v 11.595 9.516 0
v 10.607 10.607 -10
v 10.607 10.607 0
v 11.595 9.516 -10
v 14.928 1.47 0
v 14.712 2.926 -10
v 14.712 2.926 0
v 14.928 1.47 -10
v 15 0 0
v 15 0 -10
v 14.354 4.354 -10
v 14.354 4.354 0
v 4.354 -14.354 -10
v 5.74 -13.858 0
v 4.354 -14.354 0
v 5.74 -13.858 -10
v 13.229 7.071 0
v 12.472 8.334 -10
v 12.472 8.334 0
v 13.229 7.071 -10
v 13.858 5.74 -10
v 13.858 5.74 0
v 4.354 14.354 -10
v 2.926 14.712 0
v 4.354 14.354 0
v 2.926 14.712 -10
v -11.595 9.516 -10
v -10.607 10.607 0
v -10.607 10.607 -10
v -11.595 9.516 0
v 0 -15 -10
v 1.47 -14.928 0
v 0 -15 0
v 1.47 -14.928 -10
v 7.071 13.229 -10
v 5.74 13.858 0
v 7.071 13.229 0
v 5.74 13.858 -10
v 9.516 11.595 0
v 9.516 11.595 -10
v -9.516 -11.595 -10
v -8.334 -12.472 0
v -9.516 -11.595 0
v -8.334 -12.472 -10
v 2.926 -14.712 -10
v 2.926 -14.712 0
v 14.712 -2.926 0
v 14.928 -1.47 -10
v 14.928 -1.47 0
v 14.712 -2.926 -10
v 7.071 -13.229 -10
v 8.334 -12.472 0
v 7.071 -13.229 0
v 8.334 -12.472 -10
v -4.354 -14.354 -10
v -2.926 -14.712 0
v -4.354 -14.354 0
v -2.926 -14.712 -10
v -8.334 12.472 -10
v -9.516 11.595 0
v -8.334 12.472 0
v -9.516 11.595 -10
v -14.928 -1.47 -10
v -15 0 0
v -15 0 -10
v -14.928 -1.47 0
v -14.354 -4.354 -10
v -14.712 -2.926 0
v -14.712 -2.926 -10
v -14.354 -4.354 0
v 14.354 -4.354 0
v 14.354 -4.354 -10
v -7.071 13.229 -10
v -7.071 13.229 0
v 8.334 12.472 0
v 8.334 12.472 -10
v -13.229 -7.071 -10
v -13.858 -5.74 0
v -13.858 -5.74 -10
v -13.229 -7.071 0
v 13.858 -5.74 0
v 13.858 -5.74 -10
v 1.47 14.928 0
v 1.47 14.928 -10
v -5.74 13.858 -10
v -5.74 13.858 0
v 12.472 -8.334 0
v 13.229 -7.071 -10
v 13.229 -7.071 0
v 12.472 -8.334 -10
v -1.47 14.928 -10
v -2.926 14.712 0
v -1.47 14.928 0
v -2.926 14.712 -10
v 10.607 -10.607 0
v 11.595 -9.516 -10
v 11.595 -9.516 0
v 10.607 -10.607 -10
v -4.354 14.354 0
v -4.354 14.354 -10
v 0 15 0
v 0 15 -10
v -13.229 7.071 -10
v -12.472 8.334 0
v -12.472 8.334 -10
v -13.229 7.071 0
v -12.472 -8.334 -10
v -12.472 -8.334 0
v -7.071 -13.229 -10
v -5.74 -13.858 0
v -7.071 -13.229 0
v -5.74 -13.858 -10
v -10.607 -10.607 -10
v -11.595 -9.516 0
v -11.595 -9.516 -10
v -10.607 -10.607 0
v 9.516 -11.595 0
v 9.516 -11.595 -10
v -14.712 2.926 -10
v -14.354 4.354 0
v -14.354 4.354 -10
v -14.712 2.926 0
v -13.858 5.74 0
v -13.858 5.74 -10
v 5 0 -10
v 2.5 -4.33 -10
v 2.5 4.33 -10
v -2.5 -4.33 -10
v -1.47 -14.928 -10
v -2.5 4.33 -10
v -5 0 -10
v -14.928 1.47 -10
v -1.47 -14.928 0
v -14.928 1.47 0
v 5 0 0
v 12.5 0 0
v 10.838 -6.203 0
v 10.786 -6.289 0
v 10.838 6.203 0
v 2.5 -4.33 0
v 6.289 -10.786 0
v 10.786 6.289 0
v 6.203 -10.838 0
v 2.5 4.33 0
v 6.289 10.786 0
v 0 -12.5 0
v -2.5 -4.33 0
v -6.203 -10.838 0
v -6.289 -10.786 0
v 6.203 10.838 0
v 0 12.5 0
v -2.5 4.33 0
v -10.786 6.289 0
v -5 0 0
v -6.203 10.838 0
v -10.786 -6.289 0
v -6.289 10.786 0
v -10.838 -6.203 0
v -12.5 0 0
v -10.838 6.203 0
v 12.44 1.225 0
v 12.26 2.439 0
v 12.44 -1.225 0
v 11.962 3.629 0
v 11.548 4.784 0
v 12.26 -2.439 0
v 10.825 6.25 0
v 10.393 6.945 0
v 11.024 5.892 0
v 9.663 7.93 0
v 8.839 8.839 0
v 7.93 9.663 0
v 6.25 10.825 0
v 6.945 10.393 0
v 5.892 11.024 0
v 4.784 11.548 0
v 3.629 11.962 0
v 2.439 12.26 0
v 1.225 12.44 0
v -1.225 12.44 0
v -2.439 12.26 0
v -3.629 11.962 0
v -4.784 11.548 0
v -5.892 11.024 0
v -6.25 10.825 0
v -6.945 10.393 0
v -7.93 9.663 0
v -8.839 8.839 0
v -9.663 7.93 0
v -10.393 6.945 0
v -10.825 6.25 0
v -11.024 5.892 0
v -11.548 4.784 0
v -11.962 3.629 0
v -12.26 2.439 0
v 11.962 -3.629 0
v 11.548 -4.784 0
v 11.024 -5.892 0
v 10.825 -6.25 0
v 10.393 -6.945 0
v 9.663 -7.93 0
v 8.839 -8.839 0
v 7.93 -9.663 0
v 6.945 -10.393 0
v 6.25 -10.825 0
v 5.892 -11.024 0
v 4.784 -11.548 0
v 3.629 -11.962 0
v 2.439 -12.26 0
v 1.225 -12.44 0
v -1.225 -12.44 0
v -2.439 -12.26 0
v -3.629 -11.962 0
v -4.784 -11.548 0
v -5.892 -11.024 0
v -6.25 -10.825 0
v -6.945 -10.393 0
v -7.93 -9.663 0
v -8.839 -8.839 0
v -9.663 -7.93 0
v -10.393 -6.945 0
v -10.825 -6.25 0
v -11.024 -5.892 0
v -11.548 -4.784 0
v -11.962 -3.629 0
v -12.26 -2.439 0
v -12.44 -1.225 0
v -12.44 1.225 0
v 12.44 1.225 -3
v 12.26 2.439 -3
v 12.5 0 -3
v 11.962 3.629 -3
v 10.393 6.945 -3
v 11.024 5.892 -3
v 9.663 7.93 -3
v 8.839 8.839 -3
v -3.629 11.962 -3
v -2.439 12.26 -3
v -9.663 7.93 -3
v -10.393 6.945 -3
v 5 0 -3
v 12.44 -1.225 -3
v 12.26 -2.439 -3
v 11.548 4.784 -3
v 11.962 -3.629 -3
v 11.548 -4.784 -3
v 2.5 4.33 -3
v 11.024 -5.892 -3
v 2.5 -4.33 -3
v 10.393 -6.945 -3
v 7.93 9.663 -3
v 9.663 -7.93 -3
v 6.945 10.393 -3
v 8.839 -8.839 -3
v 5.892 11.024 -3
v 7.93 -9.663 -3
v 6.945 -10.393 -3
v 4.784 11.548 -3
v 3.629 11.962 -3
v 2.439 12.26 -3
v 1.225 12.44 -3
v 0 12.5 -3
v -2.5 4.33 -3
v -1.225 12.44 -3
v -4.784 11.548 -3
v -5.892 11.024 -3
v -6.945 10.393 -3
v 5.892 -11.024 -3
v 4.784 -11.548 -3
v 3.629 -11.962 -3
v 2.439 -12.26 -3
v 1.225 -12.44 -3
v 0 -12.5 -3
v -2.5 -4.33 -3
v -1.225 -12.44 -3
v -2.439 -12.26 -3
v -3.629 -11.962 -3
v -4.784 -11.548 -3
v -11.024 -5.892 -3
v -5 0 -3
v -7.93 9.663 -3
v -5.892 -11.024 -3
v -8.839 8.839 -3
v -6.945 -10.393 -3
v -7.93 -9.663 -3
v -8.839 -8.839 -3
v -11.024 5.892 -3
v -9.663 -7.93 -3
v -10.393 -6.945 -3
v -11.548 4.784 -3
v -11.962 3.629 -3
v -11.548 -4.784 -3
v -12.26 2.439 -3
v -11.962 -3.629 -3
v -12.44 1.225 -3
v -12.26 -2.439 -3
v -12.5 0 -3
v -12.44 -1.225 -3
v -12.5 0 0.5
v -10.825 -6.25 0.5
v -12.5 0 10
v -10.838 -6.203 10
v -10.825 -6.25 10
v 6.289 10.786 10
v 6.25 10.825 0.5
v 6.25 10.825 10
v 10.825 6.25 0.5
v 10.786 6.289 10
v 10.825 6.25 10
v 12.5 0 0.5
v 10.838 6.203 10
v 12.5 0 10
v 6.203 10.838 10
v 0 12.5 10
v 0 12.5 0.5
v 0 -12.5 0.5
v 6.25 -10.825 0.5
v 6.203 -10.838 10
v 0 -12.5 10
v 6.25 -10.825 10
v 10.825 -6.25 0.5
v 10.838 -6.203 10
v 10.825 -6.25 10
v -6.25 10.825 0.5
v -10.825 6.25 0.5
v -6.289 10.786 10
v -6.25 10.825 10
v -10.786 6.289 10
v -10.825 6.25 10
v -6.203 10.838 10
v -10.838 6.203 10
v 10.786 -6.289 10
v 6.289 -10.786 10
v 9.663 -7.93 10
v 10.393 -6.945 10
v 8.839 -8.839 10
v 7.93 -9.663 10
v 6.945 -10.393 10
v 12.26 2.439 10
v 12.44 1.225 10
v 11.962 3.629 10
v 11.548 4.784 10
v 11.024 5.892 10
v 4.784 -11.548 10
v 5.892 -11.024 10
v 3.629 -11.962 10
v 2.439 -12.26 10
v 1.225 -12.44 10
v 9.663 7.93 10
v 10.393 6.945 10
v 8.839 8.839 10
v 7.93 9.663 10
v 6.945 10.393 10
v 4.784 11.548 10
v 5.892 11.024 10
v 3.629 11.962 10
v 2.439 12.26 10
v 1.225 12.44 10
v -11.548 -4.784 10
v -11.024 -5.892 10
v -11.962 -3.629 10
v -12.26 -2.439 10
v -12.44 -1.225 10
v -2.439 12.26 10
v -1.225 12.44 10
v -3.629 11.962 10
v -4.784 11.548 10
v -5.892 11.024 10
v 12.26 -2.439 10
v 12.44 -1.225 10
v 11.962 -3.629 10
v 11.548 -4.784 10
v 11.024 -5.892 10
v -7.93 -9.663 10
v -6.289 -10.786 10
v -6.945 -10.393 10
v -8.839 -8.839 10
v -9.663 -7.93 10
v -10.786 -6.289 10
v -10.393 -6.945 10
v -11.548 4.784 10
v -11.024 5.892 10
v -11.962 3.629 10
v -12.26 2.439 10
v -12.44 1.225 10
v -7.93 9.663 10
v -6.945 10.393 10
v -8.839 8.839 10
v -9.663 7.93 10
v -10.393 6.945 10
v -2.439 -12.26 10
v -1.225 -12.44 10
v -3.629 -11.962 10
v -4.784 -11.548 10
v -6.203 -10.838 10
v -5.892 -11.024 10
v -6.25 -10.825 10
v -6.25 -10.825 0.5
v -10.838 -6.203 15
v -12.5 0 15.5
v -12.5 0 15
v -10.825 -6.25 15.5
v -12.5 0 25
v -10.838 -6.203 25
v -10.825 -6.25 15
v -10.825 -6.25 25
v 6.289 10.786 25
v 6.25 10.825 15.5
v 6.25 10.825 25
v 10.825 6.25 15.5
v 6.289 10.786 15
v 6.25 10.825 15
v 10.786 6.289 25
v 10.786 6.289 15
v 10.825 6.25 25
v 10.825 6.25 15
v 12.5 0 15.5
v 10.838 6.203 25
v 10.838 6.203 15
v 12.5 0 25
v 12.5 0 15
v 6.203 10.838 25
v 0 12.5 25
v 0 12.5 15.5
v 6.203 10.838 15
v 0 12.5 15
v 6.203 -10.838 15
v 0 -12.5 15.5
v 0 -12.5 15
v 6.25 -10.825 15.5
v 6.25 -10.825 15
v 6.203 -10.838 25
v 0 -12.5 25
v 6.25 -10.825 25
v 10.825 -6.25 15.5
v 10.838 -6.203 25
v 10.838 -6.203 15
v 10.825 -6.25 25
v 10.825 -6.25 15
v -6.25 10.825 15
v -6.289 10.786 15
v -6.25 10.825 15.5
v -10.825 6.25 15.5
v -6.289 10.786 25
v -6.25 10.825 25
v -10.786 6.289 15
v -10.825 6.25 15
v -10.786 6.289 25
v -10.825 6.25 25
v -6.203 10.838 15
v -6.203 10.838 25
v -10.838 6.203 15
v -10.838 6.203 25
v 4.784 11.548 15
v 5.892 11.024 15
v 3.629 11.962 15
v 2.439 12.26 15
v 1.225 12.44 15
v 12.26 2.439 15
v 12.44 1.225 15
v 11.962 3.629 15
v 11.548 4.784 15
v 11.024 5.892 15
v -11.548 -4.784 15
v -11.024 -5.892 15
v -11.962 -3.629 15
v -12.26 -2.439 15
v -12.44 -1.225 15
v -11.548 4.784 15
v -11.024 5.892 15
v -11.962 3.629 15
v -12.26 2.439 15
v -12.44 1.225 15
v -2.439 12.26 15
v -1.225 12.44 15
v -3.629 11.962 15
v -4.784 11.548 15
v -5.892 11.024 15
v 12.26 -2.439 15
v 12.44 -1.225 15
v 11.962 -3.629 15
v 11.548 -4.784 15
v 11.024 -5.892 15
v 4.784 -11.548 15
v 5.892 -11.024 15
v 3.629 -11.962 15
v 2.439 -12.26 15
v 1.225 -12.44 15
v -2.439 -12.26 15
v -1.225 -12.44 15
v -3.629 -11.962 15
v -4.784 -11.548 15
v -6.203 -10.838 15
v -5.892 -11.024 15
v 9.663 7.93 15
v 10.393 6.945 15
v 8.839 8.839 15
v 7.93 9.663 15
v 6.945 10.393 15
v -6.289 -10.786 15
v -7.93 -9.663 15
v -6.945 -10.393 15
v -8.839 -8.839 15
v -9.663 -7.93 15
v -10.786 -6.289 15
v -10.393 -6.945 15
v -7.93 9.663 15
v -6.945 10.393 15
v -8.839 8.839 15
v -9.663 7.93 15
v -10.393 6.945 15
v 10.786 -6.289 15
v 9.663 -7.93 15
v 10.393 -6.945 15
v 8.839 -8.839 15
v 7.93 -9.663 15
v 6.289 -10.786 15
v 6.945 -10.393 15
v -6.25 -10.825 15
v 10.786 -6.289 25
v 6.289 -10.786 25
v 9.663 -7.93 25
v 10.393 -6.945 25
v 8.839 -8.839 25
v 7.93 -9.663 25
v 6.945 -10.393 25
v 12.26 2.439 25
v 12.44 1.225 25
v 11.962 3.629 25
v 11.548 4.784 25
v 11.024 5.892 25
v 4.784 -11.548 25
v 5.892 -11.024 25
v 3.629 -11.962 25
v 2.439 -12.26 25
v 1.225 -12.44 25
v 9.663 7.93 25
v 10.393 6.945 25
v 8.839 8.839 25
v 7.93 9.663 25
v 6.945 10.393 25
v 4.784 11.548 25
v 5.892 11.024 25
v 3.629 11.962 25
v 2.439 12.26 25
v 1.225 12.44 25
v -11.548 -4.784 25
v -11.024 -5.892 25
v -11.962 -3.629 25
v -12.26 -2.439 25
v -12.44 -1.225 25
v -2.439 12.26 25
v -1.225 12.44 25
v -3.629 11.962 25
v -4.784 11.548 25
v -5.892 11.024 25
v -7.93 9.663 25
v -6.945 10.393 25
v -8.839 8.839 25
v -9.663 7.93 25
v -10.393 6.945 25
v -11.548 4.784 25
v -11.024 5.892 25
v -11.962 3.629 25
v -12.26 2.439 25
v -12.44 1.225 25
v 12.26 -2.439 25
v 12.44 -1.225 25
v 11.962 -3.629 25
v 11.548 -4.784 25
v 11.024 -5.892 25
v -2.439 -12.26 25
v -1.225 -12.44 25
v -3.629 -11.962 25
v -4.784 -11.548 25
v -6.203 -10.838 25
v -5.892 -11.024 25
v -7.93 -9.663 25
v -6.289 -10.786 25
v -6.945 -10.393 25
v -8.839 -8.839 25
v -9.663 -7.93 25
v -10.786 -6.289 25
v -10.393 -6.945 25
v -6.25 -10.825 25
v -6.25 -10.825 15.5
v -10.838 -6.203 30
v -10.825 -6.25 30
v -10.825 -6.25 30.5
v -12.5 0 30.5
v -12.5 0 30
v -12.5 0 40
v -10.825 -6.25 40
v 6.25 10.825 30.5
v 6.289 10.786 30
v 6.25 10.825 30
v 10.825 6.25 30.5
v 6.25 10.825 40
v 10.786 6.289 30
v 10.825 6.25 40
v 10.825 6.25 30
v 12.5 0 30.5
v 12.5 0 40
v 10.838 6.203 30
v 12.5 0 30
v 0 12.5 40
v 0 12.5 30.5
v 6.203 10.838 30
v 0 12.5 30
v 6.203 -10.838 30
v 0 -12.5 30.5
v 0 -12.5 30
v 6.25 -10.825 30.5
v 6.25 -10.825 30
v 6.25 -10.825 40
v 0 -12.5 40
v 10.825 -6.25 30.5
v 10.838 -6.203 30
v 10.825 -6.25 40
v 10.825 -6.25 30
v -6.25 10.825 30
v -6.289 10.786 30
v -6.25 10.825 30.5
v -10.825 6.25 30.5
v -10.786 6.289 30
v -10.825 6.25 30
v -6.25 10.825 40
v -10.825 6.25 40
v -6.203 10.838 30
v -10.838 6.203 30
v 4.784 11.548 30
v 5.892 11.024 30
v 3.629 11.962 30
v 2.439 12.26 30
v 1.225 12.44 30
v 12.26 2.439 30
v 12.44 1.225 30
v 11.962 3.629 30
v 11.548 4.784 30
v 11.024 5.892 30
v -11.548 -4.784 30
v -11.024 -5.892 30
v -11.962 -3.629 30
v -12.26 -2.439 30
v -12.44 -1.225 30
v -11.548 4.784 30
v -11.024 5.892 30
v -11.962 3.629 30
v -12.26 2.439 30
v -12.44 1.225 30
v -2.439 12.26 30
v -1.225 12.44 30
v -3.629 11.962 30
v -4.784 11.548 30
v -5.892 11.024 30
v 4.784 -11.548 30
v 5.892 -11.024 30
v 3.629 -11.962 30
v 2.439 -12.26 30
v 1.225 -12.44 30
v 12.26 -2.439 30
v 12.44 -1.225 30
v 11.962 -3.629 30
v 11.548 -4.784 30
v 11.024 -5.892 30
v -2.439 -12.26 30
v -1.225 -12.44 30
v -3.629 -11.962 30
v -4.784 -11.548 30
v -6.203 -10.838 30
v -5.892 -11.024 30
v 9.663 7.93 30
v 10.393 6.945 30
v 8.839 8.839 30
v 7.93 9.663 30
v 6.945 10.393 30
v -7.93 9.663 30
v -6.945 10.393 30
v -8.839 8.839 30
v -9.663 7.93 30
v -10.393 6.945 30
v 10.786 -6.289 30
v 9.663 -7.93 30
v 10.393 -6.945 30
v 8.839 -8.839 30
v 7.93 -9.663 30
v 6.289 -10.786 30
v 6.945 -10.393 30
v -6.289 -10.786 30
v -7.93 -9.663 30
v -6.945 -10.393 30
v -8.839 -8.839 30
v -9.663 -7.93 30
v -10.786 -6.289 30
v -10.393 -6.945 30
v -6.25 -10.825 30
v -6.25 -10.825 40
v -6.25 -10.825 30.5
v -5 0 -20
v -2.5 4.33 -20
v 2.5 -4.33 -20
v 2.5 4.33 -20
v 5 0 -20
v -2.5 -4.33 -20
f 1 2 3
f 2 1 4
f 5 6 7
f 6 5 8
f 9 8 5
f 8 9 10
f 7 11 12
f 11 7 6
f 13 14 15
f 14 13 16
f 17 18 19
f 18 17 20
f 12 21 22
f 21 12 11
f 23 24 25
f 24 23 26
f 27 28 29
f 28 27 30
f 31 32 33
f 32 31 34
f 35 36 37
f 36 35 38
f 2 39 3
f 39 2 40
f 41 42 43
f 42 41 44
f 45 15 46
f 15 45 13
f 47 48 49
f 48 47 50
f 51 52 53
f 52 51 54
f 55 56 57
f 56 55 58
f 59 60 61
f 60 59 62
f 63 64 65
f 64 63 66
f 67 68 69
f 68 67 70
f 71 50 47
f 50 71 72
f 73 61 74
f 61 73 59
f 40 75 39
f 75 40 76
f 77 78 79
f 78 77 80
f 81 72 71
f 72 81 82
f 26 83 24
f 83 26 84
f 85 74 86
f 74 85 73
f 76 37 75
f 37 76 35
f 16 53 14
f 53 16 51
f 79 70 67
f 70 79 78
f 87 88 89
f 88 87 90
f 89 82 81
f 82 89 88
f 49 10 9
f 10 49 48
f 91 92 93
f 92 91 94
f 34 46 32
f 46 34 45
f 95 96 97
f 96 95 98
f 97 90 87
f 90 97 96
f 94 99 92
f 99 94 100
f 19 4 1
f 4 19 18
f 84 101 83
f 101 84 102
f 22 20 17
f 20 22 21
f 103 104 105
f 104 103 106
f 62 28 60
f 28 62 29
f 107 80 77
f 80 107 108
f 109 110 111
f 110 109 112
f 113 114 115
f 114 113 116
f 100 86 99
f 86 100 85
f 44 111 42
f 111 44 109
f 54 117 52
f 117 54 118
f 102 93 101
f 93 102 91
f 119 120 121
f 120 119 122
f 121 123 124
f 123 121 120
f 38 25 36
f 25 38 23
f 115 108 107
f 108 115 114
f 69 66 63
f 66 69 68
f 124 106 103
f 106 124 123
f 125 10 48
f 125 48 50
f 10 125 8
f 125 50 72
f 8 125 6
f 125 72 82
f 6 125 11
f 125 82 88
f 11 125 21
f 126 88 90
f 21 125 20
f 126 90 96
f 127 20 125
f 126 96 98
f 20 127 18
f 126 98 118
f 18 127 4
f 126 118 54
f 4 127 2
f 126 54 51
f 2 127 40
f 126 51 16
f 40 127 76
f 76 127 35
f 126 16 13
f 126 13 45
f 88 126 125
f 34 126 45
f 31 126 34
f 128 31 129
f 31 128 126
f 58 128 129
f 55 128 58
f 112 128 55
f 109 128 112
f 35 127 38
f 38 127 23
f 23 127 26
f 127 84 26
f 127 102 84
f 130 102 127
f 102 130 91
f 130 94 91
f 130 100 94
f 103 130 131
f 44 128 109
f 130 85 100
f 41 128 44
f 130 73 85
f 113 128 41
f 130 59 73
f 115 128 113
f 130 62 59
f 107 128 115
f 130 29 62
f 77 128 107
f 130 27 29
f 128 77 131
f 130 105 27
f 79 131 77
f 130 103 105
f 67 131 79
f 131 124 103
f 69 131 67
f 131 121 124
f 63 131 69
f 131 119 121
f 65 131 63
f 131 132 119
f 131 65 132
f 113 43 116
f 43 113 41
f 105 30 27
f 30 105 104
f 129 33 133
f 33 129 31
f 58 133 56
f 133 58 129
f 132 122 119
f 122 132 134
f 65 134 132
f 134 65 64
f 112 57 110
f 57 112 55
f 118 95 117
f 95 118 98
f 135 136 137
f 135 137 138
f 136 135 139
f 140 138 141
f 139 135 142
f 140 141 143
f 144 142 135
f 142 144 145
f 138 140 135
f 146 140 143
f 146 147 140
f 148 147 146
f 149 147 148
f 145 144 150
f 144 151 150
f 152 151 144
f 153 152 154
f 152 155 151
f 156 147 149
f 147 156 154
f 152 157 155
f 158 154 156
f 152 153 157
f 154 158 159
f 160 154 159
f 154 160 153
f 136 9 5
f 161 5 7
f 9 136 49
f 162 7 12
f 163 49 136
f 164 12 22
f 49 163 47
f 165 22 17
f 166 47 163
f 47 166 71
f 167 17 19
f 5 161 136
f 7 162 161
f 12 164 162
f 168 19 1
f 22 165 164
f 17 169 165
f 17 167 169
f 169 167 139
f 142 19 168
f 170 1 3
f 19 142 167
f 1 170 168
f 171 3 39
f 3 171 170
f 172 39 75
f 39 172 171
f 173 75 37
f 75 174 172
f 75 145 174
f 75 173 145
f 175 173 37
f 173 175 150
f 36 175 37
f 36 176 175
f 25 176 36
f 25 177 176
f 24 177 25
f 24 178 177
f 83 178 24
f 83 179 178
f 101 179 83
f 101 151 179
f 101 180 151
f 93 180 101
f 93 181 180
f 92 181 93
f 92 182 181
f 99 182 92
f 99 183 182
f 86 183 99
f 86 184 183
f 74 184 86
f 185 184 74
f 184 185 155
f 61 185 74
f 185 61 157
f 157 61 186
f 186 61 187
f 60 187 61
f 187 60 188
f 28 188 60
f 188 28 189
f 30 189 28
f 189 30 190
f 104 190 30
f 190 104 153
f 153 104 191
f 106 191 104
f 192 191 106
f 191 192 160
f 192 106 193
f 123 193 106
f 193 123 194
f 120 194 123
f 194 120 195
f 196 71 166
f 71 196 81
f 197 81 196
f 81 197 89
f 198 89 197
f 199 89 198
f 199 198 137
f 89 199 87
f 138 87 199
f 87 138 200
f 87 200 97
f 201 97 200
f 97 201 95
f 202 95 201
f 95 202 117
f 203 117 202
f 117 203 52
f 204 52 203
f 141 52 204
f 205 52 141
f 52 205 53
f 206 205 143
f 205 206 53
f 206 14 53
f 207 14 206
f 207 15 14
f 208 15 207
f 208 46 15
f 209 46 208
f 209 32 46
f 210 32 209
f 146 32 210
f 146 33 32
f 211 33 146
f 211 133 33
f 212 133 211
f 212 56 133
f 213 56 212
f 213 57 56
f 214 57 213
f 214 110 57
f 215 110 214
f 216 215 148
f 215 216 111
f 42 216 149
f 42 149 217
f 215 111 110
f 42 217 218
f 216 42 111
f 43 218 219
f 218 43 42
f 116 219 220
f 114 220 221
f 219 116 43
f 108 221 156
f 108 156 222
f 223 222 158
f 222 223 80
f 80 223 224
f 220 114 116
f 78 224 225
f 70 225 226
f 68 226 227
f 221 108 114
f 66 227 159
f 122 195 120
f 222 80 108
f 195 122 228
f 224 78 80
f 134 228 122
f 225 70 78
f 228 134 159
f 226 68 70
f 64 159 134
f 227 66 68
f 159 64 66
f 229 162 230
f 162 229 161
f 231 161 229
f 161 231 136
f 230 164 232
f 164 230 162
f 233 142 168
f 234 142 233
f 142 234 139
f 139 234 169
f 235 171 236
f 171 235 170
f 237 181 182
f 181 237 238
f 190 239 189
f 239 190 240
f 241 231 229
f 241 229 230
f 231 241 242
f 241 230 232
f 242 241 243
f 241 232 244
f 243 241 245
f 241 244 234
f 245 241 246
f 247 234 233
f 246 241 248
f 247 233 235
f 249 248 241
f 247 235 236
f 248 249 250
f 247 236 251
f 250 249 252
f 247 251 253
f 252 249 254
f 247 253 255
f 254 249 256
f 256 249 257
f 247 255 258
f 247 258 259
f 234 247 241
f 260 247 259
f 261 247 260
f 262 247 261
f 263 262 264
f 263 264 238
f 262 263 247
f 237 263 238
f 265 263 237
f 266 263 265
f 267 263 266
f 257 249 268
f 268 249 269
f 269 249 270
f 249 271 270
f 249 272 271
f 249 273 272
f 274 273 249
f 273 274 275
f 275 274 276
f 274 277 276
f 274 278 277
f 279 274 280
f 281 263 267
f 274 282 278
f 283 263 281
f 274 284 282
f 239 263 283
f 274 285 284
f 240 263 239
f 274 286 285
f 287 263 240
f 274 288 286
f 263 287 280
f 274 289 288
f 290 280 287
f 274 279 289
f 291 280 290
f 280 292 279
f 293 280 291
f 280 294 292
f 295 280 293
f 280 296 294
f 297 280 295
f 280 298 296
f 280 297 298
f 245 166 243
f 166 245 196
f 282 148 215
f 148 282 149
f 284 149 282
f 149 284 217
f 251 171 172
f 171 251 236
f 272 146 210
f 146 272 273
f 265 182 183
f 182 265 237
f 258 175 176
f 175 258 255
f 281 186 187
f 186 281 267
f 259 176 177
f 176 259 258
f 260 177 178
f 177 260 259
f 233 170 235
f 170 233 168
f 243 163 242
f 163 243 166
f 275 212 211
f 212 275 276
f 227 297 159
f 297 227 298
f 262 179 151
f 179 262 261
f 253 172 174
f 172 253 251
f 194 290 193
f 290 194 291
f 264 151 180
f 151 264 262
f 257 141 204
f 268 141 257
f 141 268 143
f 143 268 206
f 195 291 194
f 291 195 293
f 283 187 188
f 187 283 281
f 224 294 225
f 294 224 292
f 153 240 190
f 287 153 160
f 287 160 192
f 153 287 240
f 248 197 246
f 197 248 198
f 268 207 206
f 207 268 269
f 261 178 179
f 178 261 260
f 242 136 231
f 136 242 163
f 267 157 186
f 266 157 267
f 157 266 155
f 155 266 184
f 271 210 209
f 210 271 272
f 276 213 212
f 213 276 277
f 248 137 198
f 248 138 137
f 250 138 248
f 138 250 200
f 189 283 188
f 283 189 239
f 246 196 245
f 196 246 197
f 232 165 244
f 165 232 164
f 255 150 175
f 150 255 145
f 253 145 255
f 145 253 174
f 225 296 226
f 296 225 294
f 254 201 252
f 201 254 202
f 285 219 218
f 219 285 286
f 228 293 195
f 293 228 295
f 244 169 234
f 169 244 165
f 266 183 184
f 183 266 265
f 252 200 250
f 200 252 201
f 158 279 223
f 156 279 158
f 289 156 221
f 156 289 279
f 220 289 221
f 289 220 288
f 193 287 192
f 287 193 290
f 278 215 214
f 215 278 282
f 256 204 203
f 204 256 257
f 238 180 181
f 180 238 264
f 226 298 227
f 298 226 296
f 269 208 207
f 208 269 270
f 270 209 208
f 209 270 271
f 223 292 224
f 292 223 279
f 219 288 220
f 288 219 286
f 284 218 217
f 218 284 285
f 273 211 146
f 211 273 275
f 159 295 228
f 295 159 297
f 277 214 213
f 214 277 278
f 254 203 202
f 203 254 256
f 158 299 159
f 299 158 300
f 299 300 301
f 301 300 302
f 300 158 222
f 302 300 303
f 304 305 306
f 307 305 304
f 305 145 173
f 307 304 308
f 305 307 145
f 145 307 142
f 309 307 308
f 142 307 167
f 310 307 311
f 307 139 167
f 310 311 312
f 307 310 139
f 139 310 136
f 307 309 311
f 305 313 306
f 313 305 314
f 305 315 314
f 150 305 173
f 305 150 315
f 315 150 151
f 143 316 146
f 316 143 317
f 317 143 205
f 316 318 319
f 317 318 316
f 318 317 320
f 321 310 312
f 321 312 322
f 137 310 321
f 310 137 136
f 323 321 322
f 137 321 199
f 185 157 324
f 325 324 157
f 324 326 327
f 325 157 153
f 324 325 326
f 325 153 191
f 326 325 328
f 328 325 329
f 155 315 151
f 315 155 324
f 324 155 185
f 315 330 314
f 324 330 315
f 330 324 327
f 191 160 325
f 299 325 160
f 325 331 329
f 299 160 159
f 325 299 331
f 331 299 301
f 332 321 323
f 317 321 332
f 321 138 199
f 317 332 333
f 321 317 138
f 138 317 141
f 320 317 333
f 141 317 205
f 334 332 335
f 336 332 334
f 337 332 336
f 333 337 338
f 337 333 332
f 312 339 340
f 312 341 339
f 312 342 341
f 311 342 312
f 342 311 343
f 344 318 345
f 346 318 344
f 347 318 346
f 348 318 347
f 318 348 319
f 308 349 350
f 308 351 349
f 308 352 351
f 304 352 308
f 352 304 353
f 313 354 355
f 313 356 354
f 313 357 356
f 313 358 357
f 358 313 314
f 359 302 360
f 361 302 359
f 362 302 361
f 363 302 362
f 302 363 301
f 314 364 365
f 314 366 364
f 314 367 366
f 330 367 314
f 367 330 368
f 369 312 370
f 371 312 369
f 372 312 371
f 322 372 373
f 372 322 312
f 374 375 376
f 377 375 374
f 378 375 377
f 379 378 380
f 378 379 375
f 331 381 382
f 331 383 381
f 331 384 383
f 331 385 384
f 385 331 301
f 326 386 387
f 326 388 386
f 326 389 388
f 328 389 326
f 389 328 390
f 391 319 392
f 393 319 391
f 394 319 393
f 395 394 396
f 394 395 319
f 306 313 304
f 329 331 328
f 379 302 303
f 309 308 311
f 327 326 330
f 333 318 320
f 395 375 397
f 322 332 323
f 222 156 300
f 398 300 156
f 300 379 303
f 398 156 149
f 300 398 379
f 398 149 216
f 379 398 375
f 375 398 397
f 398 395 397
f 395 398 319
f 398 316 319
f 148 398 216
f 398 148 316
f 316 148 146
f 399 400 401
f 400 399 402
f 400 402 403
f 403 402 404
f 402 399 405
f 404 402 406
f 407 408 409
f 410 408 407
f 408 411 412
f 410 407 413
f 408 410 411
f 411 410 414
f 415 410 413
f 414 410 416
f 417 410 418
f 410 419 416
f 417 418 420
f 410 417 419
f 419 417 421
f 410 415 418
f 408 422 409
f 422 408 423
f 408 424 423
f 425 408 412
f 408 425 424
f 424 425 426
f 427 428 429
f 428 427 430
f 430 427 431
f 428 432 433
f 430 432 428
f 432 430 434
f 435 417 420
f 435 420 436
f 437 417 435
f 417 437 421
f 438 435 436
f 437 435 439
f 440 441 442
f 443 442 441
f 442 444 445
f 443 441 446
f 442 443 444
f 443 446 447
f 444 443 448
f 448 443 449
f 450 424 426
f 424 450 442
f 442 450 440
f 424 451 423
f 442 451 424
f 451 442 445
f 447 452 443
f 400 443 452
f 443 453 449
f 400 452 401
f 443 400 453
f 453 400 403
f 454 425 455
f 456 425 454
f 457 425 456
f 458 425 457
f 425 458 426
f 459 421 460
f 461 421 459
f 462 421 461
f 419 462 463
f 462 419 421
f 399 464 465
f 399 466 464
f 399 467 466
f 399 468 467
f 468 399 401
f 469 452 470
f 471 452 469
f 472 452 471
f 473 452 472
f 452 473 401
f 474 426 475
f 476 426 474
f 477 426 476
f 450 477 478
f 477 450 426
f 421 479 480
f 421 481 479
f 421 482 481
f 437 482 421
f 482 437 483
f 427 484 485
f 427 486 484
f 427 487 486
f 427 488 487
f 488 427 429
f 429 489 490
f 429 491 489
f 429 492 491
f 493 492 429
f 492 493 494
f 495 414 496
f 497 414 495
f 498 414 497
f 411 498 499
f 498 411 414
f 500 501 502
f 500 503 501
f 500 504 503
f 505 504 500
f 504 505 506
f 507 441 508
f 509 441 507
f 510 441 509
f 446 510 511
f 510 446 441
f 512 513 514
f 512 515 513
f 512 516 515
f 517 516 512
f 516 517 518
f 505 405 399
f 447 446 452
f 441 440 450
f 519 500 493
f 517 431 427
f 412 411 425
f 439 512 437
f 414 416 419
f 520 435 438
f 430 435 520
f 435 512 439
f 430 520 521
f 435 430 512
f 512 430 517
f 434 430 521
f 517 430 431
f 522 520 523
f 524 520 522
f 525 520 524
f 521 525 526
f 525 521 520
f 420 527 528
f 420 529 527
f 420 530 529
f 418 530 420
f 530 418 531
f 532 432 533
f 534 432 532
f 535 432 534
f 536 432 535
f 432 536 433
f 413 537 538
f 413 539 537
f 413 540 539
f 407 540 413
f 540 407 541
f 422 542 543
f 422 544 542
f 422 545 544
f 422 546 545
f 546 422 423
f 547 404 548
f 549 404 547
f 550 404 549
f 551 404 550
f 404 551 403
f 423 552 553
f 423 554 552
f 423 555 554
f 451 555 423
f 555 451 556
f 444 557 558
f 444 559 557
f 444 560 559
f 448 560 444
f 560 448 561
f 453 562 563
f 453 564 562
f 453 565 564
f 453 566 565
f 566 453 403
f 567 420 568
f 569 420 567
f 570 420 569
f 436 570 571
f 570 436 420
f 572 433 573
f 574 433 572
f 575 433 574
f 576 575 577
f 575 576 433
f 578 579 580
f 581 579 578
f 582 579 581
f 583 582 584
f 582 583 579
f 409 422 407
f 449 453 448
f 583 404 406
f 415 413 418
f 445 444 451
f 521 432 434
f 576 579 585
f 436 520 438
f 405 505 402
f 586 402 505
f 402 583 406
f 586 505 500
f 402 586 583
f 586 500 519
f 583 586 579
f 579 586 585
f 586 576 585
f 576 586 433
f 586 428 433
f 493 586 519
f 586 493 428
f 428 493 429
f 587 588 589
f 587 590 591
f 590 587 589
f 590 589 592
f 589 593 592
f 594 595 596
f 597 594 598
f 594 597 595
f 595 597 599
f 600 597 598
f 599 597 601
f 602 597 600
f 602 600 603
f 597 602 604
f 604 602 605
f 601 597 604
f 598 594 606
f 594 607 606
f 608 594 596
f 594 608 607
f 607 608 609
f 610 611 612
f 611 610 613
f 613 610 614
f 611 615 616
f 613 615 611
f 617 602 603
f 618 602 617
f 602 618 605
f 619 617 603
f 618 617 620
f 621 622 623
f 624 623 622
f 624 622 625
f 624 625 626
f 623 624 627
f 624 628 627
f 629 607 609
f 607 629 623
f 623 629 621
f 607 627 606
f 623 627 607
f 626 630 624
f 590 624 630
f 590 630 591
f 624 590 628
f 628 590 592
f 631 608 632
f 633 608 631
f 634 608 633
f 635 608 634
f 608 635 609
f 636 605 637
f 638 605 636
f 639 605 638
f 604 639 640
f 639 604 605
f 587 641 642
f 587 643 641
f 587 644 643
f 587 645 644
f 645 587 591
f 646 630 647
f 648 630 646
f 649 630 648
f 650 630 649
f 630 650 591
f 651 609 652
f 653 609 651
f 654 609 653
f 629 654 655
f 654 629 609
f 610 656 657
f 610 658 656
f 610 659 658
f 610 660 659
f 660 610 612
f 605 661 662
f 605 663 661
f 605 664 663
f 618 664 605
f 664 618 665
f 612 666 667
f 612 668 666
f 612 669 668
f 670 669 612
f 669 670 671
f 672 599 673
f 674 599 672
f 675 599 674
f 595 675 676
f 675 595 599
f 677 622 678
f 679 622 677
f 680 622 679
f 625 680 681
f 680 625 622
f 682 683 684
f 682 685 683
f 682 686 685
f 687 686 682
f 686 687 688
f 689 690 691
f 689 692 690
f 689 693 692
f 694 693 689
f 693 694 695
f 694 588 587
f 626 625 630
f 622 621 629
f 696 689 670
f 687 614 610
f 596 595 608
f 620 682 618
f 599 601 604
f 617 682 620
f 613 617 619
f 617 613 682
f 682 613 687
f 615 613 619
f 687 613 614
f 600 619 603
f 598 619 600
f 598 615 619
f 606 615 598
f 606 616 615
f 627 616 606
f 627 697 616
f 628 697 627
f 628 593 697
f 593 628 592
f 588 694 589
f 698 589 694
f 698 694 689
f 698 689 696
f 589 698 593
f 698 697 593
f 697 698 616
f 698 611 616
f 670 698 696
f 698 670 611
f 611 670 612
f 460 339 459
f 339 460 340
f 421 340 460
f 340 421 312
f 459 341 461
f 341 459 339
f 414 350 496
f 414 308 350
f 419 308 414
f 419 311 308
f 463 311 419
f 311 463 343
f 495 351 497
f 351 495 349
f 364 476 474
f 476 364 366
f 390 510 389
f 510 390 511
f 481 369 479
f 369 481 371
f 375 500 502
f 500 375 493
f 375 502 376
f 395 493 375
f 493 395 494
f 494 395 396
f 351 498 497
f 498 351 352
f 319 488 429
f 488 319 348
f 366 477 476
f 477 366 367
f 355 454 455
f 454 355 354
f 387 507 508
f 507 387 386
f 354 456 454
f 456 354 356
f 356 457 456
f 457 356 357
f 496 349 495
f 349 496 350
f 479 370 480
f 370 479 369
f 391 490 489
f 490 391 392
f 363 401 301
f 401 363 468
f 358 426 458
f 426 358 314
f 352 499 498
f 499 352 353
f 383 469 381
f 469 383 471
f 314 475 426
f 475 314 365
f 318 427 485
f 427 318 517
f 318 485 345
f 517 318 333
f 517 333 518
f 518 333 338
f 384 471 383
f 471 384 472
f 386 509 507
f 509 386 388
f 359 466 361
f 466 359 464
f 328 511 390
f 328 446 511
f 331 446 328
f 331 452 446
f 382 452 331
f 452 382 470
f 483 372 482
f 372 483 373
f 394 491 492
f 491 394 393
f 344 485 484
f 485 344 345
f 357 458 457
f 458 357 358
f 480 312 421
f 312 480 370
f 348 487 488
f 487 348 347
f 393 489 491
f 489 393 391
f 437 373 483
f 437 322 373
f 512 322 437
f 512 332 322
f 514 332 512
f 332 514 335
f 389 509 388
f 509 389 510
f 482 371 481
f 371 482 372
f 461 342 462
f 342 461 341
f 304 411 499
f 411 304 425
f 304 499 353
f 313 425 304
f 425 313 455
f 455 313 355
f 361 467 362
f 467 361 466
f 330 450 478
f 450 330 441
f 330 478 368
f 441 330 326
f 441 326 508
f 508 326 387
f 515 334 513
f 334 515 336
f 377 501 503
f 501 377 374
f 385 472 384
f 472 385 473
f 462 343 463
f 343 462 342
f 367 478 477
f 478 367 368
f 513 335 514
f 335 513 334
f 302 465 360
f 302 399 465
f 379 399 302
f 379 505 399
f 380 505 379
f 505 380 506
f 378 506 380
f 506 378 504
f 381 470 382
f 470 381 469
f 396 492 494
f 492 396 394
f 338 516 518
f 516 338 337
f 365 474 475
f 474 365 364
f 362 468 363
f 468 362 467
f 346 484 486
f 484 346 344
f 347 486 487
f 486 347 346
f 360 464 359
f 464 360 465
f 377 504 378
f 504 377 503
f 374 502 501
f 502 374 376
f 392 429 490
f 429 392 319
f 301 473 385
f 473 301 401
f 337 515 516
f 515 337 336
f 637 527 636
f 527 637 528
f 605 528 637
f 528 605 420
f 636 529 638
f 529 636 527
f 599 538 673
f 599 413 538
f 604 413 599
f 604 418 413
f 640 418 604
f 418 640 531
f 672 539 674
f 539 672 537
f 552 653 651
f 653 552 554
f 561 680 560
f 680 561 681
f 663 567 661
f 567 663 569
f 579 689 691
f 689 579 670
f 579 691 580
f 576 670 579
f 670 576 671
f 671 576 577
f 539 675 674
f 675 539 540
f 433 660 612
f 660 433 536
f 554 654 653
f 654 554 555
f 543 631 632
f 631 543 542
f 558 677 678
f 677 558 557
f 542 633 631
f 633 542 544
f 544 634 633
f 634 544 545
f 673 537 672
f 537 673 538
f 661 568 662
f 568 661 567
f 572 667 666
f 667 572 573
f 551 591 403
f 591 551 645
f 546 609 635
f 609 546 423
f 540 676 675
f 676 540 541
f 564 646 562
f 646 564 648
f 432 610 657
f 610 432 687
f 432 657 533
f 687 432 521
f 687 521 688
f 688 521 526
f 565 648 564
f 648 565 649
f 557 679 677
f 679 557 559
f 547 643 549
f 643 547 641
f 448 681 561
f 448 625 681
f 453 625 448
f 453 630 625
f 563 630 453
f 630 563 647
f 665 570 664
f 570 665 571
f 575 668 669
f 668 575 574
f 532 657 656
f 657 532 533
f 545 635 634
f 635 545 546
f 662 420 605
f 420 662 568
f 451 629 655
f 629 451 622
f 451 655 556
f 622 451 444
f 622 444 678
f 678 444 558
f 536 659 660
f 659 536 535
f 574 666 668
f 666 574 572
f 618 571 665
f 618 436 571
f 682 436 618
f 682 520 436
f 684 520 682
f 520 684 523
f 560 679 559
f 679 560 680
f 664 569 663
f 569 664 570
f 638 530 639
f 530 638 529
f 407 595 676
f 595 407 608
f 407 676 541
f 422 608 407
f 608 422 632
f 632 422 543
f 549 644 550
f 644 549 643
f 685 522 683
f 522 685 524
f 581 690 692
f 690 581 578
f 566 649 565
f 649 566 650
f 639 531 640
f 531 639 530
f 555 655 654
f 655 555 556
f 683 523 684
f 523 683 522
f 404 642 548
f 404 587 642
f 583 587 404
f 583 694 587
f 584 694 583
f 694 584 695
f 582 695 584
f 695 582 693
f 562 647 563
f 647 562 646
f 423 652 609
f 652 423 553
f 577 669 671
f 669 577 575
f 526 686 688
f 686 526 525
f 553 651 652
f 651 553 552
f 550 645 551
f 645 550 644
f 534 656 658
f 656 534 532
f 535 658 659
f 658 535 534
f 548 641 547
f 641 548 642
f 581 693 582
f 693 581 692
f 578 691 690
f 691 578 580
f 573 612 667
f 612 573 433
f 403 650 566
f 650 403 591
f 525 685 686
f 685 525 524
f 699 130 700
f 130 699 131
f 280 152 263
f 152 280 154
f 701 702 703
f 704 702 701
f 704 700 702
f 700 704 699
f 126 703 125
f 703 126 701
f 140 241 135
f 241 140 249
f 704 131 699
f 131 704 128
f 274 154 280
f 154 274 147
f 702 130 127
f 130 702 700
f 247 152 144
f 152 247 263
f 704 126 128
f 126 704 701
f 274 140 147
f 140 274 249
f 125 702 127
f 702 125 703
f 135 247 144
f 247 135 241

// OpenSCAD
module hex_bore(size, depth) {
    translate([0, 0, -depth/2])
        linear_extrude(height = depth)
            polygon(points = [
                [size/2, 0],
                [size/4, size * sqrt(3)/4],
                [-size/4, size * sqrt(3)/4],
                [-size/2, 0],
                [-size/4, -size * sqrt(3)/4],
                [size/4, -size * sqrt(3)/4]
            ]);
}

module knurled_band(diameter, height, segments) {
    rotate([0, 0, 0])
        cylinder(d = diameter, h = height, $fn = segments);
}

module serrated_cylinder(diameter, height, serration_height, segments) {
    difference() {
        cylinder(d = diameter, h = height, $fn = segments);
        for (i = [0:segments-1]) {
            rotate([0, 0, i * 360/segments])
                translate([diameter/2, 0, 0])
                    rotate([0, 90, 0])
                        cylinder(d = serration_height, h = diameter, $fn = 3);
        }
    }
}

module stepped_flange(diameter, height, step_diameter, step_height, segments) {
    difference() {
        cylinder(d = diameter, h = height, $fn = segments);
        translate([0, 0, height - step_height])
            cylinder(d = step_diameter, h = step_height, $fn = segments);
    }
}

module coupling() {
    union() {
        translate([0, 0, -10])
            stepped_flange(30, 10, 25, 3, 64);
        translate([0, 0, 0])
            serrated_cylinder(25, 10, 2, 12);
        translate([0, 0, 10])
            knurled_band(25, 5, 64);
        translate([0, 0, 15])
            serrated_cylinder(25, 10, 2, 12);
        translate([0, 0, 25])
            knurled_band(25, 5, 64);
        translate([0, 0, 30])
            serrated_cylinder(25, 10, 2, 12);
        translate([0, 0, 0])
            hex_bore(10, 40);
    }
}

coupling();
